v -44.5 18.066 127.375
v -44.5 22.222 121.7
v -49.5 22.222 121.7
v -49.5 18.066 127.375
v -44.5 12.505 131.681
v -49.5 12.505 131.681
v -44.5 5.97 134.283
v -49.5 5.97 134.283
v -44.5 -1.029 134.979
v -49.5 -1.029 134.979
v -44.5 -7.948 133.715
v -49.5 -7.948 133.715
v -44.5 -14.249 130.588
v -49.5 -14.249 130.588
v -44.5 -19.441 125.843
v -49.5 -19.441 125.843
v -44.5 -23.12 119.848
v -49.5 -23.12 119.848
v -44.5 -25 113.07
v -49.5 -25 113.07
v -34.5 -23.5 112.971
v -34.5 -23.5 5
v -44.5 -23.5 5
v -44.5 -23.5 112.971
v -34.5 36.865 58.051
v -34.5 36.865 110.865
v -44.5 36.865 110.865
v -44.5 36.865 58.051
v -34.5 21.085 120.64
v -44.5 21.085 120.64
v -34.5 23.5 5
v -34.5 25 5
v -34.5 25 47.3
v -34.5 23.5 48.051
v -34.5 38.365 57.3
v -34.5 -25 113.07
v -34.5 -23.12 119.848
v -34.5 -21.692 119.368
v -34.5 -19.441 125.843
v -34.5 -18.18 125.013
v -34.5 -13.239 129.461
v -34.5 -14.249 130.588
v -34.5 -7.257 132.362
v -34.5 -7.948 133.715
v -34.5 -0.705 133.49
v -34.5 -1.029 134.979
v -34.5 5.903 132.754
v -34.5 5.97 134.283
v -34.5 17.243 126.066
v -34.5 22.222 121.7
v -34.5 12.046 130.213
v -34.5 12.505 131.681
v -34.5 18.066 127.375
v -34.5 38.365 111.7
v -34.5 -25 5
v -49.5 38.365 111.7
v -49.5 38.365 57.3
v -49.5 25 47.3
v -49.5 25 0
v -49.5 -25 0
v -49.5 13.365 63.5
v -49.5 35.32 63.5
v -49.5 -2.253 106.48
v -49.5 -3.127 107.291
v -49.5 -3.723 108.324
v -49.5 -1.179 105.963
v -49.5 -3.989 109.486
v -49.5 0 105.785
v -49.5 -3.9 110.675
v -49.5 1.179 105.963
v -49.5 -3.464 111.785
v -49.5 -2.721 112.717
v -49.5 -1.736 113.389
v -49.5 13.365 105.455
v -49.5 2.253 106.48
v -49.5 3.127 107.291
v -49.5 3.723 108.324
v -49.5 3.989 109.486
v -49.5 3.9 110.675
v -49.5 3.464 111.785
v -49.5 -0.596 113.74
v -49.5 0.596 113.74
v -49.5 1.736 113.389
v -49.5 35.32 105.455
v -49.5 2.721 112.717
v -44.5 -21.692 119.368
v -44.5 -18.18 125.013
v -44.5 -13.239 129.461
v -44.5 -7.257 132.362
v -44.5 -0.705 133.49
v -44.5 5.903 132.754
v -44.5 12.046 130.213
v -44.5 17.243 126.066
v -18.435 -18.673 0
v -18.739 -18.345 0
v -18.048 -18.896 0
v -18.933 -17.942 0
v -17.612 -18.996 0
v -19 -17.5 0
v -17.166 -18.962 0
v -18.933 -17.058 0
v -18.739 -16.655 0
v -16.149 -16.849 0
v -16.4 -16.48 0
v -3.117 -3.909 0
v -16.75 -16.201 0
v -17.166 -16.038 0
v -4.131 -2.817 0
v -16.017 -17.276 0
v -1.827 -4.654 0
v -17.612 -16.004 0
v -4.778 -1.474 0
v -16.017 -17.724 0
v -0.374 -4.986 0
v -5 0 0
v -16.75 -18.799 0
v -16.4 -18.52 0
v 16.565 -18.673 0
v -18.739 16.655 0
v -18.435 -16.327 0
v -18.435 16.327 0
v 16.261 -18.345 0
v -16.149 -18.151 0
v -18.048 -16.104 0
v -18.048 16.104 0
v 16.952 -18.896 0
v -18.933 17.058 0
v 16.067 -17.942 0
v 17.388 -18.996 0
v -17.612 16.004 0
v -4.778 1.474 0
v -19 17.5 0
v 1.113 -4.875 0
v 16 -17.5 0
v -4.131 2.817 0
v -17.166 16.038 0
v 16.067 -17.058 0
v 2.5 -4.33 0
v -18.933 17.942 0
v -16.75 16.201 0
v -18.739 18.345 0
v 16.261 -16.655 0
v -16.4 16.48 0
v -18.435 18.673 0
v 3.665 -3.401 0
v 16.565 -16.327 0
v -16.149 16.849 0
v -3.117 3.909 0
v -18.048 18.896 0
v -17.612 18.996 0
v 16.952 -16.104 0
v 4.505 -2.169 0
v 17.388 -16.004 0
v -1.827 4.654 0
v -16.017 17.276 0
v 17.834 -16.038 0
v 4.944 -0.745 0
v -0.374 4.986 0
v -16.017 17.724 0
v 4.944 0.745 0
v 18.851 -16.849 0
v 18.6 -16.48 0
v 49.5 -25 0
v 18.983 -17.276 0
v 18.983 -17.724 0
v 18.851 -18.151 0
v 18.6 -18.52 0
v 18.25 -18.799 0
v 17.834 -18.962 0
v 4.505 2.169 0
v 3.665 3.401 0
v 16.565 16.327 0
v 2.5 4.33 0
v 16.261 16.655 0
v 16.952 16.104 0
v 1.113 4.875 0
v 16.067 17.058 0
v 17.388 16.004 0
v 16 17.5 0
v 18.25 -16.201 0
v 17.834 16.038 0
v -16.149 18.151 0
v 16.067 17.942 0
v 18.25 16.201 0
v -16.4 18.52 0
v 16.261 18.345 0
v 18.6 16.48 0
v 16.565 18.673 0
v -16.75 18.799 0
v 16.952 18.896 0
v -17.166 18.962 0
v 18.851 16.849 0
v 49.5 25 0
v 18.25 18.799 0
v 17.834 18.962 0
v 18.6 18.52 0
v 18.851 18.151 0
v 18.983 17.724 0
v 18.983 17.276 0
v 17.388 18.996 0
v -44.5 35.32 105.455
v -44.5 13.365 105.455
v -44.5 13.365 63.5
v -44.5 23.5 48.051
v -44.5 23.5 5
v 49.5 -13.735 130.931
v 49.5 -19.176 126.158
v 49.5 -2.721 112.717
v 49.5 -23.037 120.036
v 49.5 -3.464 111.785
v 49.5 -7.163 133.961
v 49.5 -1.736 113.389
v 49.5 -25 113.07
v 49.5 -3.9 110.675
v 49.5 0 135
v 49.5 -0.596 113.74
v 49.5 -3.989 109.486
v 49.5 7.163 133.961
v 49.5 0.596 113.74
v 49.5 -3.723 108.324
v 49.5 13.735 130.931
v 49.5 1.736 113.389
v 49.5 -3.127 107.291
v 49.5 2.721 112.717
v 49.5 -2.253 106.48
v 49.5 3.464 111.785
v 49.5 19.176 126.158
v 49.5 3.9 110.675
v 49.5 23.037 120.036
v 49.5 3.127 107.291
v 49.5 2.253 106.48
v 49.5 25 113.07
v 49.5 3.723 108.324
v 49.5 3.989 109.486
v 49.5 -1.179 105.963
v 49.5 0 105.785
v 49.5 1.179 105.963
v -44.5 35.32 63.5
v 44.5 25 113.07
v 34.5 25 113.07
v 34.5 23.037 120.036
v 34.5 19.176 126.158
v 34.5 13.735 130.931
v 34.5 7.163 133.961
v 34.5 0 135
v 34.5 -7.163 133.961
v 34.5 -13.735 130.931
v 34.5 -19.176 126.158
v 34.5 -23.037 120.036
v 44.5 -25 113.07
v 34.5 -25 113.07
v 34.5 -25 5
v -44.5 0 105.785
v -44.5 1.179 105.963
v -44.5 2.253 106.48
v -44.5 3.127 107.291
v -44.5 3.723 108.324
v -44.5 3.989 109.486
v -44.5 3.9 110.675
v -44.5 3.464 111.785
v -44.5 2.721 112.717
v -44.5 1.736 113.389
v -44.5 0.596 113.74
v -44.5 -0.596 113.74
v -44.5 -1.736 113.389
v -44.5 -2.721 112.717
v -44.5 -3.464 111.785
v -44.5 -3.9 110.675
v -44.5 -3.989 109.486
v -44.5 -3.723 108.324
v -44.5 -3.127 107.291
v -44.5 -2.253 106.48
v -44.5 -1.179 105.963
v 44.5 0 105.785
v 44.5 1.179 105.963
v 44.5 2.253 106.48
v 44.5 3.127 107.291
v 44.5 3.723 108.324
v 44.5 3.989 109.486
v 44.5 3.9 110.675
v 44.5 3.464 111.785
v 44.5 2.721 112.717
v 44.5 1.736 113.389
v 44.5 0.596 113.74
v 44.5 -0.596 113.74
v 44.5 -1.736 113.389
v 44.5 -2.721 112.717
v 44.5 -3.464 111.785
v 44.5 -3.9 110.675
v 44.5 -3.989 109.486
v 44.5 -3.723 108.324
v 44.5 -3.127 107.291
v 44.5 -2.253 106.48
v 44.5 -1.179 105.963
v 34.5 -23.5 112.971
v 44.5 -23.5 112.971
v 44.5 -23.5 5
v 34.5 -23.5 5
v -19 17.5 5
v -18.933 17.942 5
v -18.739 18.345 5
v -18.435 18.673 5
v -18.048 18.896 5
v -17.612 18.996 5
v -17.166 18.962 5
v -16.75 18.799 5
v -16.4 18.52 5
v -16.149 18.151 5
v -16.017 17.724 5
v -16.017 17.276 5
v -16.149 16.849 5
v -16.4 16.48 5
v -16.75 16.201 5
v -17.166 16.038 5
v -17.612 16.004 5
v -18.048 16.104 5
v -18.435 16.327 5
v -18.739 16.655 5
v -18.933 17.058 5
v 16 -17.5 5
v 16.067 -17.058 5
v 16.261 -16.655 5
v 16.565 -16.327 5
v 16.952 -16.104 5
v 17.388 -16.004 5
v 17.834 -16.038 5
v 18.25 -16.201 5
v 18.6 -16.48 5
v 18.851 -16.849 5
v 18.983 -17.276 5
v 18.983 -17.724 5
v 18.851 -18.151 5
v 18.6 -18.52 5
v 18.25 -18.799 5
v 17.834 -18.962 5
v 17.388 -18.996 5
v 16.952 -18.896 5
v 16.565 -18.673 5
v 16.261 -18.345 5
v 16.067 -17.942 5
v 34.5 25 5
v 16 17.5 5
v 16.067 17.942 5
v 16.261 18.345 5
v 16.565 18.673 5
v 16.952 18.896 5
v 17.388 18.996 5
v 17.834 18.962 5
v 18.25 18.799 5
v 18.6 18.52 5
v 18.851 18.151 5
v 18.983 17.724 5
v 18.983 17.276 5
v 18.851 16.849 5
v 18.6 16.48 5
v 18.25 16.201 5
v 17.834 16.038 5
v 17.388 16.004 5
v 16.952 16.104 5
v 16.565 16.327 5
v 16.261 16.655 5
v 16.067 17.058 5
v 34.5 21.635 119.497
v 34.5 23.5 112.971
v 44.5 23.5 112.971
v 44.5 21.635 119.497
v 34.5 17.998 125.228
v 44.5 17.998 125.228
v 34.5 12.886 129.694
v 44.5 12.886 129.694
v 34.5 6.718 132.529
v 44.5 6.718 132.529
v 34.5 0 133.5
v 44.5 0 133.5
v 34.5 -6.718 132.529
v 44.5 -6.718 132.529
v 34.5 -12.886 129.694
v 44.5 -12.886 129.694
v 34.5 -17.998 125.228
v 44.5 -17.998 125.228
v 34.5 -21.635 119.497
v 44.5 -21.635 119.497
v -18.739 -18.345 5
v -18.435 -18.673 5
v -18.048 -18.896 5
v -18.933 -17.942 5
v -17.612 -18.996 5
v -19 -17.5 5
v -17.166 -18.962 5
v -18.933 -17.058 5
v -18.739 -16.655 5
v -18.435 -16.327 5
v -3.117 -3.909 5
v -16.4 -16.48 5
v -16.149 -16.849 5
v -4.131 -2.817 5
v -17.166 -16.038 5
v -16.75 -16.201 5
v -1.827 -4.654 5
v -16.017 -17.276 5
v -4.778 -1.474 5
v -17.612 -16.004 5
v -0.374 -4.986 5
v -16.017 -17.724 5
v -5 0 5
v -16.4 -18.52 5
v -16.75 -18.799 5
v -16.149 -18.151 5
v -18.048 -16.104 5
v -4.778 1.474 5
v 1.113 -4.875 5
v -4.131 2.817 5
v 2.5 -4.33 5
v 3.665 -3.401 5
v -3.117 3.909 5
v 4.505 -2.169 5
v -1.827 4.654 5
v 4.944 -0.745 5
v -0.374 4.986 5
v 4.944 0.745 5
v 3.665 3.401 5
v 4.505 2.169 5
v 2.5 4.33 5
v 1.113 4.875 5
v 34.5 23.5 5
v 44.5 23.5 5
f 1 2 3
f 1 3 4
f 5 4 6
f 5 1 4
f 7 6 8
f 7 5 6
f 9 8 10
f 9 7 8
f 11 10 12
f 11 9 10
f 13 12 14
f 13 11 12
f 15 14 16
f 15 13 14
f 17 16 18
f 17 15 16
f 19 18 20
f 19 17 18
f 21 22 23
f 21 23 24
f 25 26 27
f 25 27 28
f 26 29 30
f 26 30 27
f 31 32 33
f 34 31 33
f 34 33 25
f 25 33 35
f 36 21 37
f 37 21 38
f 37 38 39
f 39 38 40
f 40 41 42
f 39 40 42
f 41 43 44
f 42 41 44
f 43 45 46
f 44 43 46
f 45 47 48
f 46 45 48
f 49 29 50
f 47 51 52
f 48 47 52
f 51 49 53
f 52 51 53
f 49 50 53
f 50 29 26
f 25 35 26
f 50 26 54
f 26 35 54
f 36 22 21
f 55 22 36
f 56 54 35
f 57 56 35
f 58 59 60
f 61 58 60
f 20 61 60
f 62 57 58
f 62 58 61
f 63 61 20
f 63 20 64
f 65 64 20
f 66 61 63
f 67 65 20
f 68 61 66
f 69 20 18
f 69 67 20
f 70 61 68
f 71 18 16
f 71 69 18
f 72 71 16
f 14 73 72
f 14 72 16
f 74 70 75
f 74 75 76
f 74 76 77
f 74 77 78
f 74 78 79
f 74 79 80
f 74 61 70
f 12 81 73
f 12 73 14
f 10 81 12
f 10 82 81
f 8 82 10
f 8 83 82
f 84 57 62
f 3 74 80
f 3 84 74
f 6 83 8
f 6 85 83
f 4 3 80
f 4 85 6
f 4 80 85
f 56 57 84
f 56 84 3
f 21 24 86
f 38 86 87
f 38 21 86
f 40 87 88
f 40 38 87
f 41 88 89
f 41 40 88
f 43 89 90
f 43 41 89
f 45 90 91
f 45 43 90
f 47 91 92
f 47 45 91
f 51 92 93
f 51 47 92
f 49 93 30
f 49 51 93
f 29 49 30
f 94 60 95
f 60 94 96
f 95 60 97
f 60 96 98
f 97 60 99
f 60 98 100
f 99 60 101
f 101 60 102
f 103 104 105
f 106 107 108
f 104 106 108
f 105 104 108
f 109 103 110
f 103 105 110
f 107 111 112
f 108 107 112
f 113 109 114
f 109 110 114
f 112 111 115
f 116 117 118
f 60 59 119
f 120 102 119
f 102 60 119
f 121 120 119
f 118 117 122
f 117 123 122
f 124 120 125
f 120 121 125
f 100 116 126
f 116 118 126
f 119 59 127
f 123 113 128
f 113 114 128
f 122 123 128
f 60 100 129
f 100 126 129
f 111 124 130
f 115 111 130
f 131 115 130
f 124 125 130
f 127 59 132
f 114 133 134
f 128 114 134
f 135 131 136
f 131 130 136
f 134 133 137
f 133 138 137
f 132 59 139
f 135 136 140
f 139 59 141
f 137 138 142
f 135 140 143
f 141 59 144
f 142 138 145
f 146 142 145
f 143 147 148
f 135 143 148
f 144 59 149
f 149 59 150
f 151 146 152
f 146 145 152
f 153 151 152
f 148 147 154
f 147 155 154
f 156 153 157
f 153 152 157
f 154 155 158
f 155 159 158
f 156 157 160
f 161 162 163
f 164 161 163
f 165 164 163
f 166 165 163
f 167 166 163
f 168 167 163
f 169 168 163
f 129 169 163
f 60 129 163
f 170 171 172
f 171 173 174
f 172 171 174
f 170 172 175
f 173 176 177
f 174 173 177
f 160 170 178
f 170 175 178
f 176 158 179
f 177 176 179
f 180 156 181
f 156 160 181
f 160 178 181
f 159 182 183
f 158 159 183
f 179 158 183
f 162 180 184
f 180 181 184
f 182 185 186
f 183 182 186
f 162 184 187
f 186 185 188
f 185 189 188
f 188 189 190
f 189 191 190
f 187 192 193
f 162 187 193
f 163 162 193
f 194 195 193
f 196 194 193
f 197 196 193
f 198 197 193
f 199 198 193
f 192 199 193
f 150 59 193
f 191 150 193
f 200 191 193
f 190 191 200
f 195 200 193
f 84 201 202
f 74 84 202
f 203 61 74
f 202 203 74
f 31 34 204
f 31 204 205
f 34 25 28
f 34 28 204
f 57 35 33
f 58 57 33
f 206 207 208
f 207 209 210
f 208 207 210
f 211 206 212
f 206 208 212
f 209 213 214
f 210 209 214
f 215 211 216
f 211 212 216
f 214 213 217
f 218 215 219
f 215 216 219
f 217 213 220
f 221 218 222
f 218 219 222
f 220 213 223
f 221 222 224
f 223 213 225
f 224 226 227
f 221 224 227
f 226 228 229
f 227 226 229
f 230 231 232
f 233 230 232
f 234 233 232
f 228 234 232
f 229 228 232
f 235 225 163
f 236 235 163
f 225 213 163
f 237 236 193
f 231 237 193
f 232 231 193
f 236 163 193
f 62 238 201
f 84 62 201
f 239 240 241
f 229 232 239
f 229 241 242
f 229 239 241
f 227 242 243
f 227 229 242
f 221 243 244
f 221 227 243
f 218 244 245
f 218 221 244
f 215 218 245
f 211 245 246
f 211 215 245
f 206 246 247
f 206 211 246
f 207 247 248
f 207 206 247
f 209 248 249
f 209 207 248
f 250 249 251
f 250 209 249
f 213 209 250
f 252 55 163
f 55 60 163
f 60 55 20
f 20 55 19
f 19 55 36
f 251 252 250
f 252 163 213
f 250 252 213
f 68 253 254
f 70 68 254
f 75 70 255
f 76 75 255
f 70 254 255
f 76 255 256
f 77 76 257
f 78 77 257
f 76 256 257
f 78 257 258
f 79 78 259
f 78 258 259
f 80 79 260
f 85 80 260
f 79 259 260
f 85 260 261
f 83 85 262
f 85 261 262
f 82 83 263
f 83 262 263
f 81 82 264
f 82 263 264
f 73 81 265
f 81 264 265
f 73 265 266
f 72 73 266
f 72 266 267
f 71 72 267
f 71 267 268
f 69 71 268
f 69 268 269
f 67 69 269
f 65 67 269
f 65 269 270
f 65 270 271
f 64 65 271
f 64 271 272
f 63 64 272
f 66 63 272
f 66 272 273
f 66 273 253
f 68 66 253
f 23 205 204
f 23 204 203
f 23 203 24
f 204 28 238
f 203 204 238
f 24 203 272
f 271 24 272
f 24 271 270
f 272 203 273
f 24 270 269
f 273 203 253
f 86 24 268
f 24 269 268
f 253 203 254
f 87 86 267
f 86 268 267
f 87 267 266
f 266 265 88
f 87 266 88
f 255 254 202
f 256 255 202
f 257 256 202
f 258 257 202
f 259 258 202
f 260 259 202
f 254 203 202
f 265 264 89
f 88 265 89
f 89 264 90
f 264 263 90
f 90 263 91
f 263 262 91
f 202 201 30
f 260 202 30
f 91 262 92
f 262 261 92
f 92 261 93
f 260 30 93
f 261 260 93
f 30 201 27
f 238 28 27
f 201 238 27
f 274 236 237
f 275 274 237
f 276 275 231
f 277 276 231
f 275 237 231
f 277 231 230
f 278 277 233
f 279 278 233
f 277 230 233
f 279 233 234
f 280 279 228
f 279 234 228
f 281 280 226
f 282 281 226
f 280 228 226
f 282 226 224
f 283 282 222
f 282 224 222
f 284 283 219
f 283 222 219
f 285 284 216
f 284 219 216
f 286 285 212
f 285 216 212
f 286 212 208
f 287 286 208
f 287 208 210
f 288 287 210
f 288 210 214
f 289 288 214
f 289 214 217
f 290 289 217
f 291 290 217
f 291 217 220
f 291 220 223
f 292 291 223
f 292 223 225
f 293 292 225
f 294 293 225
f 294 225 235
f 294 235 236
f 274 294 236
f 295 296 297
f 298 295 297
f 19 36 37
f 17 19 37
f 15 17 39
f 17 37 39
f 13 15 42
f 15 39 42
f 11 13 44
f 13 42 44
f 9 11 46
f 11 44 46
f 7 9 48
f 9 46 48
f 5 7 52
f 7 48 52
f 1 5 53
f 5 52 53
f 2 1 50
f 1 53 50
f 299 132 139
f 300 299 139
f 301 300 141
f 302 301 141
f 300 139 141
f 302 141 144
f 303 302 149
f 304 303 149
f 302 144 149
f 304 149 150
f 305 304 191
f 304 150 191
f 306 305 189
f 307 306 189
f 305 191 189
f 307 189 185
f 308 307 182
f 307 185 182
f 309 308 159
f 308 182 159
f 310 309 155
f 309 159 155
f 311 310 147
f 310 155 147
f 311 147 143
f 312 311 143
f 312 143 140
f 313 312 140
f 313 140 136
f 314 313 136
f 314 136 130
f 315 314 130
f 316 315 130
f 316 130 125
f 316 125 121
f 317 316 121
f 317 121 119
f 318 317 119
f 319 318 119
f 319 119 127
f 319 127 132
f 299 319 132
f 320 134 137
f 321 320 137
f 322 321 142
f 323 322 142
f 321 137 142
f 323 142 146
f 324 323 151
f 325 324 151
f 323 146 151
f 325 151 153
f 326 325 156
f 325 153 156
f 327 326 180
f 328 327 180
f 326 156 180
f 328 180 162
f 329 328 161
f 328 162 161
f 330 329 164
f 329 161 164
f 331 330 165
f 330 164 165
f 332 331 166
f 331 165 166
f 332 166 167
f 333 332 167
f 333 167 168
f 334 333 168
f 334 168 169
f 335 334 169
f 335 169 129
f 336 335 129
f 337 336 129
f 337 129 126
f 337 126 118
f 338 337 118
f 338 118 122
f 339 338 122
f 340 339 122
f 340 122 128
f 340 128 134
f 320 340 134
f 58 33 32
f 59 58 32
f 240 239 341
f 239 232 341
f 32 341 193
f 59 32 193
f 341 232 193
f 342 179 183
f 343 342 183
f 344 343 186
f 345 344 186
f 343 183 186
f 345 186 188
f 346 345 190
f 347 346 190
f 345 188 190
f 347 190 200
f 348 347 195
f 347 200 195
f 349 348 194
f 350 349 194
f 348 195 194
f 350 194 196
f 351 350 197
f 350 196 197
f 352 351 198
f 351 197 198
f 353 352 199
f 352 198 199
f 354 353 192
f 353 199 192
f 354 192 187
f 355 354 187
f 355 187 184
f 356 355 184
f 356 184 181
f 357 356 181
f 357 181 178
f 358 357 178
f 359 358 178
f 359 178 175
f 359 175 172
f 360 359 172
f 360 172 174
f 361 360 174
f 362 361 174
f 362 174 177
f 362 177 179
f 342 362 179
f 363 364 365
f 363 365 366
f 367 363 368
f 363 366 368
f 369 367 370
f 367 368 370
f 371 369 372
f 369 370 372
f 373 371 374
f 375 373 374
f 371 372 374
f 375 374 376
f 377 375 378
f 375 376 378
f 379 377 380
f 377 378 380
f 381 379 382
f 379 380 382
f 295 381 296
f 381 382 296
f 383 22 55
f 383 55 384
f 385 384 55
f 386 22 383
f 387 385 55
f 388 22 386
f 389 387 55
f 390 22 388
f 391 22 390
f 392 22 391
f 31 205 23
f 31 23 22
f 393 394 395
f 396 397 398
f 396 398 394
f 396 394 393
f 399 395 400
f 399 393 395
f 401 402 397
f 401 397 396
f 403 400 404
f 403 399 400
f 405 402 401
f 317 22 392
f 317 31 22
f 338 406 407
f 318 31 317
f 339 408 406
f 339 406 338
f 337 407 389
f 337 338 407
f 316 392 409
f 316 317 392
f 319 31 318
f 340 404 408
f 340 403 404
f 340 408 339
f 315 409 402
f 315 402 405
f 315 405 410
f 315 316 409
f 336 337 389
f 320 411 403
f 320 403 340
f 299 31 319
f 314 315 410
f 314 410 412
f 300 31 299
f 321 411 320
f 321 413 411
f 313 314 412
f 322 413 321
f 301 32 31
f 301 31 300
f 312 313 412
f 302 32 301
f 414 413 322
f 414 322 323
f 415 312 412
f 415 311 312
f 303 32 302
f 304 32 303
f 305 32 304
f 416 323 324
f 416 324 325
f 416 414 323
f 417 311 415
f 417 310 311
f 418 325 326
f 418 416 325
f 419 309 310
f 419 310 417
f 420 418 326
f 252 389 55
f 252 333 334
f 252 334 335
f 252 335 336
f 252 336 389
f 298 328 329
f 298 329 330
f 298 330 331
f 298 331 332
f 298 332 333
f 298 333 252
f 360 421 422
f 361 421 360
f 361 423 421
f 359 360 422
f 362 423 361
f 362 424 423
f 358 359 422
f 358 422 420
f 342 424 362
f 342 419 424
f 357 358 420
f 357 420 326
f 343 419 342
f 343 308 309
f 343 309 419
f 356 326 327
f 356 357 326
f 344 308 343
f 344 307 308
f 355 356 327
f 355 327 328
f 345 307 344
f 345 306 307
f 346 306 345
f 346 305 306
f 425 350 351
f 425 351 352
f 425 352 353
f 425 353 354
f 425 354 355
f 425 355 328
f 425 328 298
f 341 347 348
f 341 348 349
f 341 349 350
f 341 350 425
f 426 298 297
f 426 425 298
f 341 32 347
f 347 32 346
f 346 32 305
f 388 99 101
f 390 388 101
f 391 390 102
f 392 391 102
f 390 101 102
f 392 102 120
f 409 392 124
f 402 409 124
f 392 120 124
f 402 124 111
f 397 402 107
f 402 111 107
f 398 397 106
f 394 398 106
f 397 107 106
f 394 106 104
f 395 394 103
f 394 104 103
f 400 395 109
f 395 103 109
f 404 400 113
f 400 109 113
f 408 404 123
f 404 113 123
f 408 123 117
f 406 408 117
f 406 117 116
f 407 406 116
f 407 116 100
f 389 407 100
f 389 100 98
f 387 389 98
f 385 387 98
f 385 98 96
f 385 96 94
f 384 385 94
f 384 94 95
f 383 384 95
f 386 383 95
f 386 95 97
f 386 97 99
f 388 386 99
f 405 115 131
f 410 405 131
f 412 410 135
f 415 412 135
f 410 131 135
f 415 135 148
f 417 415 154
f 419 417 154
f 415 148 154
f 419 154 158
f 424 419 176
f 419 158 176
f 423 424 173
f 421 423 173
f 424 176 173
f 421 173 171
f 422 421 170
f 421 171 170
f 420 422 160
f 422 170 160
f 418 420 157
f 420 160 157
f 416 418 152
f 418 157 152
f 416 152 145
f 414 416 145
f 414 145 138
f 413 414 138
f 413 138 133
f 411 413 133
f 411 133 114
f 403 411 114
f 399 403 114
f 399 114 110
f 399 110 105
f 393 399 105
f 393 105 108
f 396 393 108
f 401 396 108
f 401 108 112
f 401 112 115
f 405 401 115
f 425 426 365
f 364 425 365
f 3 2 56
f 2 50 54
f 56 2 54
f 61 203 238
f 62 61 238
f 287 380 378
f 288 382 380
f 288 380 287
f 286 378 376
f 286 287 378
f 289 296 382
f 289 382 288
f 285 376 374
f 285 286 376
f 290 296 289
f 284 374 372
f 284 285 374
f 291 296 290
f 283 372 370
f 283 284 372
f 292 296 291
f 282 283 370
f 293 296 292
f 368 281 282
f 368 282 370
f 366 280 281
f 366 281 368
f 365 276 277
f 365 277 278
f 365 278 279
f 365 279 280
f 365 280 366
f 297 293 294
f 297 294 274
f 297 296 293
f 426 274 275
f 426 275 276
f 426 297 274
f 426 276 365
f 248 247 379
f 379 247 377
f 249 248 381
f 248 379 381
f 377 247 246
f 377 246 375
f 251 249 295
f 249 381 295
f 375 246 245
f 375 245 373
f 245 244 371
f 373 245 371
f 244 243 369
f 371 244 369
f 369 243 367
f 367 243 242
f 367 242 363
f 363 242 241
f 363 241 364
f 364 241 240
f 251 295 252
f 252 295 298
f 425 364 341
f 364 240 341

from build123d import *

# Parameters (mm, degrees)
SKETCH1_W           = 99
SKETCH1_H           = 50
BOSS_EXTRUDE1_DEPTH = 5
SKETCH2_W           = 5
SKETCH2_H           = 50
BOSS_EXTRUDE2_DEPTH = 130
SKETCH3_OUTSIDE_W   = 171.944
SKETCH3_OUTSIDE_H   = 86.944
SKETCH3_OUTSIDE_R   = 4
CUT_EXTRUDE1_DEPTH  = 170.266063
EXTRUDE_THIN2_DEPTH = 15
CUT_EXTRUDE3_REACH  = 171.266
SKETCH8_W           = 42.955183
SKETCH8_H           = 22
BOSS_EXTRUDE4_START = -5
BOSS_EXTRUDE4_DEPTH = 5
EXTRUDE_THIN3_START = -15
EXTRUDE_THIN3_DEPTH = 15
CUT_EXTRUDE5_REACH  = 150.819
SKETCH13_R          = 5
SKETCH5_R           = 1.5
CUT_EXTRUDE6_DEPTH  = 149.819085


with BuildPart() as part:
    # Sketch1 → Boss-Extrude1 (new body)
    with BuildSketch(Plane.XY):
        Rectangle(SKETCH1_W, SKETCH1_H)
    extrude(amount=BOSS_EXTRUDE1_DEPTH)

    # Sketch2 → Boss-Extrude2 (add)
    with BuildSketch(Plane.XY.offset(5)):
        with Locations((47, 0)):
            Rectangle(SKETCH2_W, SKETCH2_H)
        with Locations((-47, 0)):
            Rectangle(SKETCH2_W, SKETCH2_H)
    extrude(amount=BOSS_EXTRUDE2_DEPTH)

    # Sketch3 outside → Cut-Extrude1 (cut, through all)
    # profile 1 of 2: a face of its own
    with BuildSketch(Plane(origin=(49.5, 0, 0), x_dir=(0, 0, -1), z_dir=(1, 0, 0))):
        with Locations((-67.5, 0)):
            Rectangle(SKETCH3_OUTSIDE_W, SKETCH3_OUTSIDE_H)
        with BuildLine():
            Line((0, -25), (0, 25))
            Line((0, 25), (-106.5, 25))
            ThreePointArc((-106.5, 25), (-135, 0), (-106.5, -25))
            Line((-106.5, -25), (0, -25))
        make_face(mode=Mode.SUBTRACT)
    # profile 2 of 2: a face of its own
    with BuildSketch(Plane(origin=(49.5, 0, 0), x_dir=(0, 0, -1), z_dir=(1, 0, 0))):
        with Locations((-109.785088, 0)):
            Circle(SKETCH3_OUTSIDE_R)
    extrude(amount=-CUT_EXTRUDE1_DEPTH, mode=Mode.SUBTRACT)

    # Sketch7 → Extrude-Thin2 (add)
    with BuildSketch(Plane(origin=(49.5, 0, 0), x_dir=(0, 0, -1), z_dir=(1, 0, 0))):
        with BuildLine():
            Line((-113.070175, -25), (0, -25))
            Line((0, -25), (0, 25))
            Line((0, 25), (-113.070175, 25))
            ThreePointArc((-113.070175, 25), (-135, 0), (-113.070175, -25))
        make_face()
        with BuildLine():
            Line((-112.970533, -23.5), (-1.5, -23.5))
            Line((-1.5, -23.5), (-1.5, 23.5))
            Line((-1.5, 23.5), (-112.970533, 23.5))
            ThreePointArc((-112.970533, 23.5), (-133.5, 0), (-112.970533, -23.5))
        make_face(mode=Mode.SUBTRACT)
    extrude(amount=-EXTRUDE_THIN2_DEPTH)

    # Sketch8 → Cut-Extrude3 (cut, up to next)
    with BuildSketch(Plane.ZY.offset(49.5), mode=Mode.PRIVATE) as cut_extrude3_sk1:
        with Locations((84.477591, 24.364958)):
            Rectangle(SKETCH8_W, SKETCH8_H)
    cut_extrude3_tool1 = extrude(cut_extrude3_sk1.sketch, amount=-CUT_EXTRUDE3_REACH, mode=Mode.PRIVATE) & part.part
    add(cut_extrude3_tool1.solids().sort_by_distance((-49.5, 24.364958, 84.477592))[0], mode=Mode.SUBTRACT)

    # Sketch9 → Boss-Extrude4 (add)
    with BuildSketch(Plane.ZY.offset(49.5).offset(BOSS_EXTRUDE4_START)):
        with BuildLine():
            Line((121.7, 22.222211), (111.7, 38.364958))
            Line((111.7, 38.364958), (105.455183, 38.364958))
            Line((105.455183, 38.364958), (63.5, 38.364958))
            Line((63.5, 38.364958), (57.3, 38.364958))
            Line((57.3, 38.364958), (47.3, 25))
            Line((47.3, 25), (59.748378, 25))
            Line((59.748378, 25), (63, 25))
            Line((63, 25), (63, 13.364958))
            Line((63, 13.364958), (63.5, 13.364958))
            Line((63.5, 13.364958), (63.5, 35.320141))
            Line((63.5, 35.320141), (105.455183, 35.320141))
            Line((105.455183, 35.320141), (105.455183, 13.364958))
            Line((105.455183, 13.364958), (105.955183, 13.364958))
            Line((105.955183, 13.364958), (105.955183, 25))
            Line((105.955183, 25), (113.070175, 25))
            ThreePointArc((113.070175, 25), (117.510955, 24.002141), (121.7, 22.222211))
        make_face()
    extrude(amount=BOSS_EXTRUDE4_DEPTH)

    # Sketch12 → Extrude-Thin3 (add)
    with BuildSketch(Plane.ZY.offset(49.5).offset(EXTRUDE_THIN3_START)):
        with BuildLine():
            Line((121.7, 22.222211), (111.7, 38.364958))
            Line((111.7, 38.364958), (57.3, 38.364958))
            Line((57.3, 38.364958), (47.3, 25))
            Line((47.3, 25), (0, 25))
            Line((0, 25), (0, -25))
            Line((0, -25), (113.070175, -25))
            ThreePointArc((113.070175, -25), (134.589206, -4.532935), (121.7, 22.222211))
        make_face()
        with BuildLine():
            Line((120.640171, 21.084692), (110.864718, 36.864958))
            Line((110.864718, 36.864958), (58.051066, 36.864958))
            Line((58.051066, 36.864958), (48.051066, 23.5))
            Line((48.051066, 23.5), (1.5, 23.5))
            Line((1.5, 23.5), (1.5, -23.5))
            Line((1.5, -23.5), (112.970533, -23.5))
            ThreePointArc((112.970533, -23.5), (133.156712, -4.020481), (120.640171, 21.084692))
        make_face(mode=Mode.SUBTRACT)
    extrude(amount=EXTRUDE_THIN3_DEPTH)

    # Sketch13 → Cut-Extrude5 (cut, up to next)
    with BuildSketch(Plane(origin=(0, 0, 0), x_dir=(-1, 0, 0), z_dir=(0, 0, -1)), mode=Mode.PRIVATE) as cut_extrude5_sk1:
        Circle(SKETCH13_R)
    cut_extrude5_tool1 = extrude(cut_extrude5_sk1.sketch, amount=-CUT_EXTRUDE5_REACH, mode=Mode.PRIVATE) & part.part
    add(cut_extrude5_tool1.solids().sort_by_distance((0, 0, 0))[0], mode=Mode.SUBTRACT)

    # Sketch5 → Cut-Extrude6 (cut, through all)
    with BuildSketch(Plane(origin=(0, 0, 0), x_dir=(-1, 0, 0), z_dir=(0, 0, -1))):
        with Locations((17.5, 17.5)):
            Circle(SKETCH5_R)
        with Locations((17.5, -17.5)):
            Circle(SKETCH5_R)
        with Locations((-17.5, -17.5)):
            Circle(SKETCH5_R)
        with Locations((-17.5, 17.5)):
            Circle(SKETCH5_R)
    extrude(amount=-CUT_EXTRUDE6_DEPTH, mode=Mode.SUBTRACT)


solid = part.part
